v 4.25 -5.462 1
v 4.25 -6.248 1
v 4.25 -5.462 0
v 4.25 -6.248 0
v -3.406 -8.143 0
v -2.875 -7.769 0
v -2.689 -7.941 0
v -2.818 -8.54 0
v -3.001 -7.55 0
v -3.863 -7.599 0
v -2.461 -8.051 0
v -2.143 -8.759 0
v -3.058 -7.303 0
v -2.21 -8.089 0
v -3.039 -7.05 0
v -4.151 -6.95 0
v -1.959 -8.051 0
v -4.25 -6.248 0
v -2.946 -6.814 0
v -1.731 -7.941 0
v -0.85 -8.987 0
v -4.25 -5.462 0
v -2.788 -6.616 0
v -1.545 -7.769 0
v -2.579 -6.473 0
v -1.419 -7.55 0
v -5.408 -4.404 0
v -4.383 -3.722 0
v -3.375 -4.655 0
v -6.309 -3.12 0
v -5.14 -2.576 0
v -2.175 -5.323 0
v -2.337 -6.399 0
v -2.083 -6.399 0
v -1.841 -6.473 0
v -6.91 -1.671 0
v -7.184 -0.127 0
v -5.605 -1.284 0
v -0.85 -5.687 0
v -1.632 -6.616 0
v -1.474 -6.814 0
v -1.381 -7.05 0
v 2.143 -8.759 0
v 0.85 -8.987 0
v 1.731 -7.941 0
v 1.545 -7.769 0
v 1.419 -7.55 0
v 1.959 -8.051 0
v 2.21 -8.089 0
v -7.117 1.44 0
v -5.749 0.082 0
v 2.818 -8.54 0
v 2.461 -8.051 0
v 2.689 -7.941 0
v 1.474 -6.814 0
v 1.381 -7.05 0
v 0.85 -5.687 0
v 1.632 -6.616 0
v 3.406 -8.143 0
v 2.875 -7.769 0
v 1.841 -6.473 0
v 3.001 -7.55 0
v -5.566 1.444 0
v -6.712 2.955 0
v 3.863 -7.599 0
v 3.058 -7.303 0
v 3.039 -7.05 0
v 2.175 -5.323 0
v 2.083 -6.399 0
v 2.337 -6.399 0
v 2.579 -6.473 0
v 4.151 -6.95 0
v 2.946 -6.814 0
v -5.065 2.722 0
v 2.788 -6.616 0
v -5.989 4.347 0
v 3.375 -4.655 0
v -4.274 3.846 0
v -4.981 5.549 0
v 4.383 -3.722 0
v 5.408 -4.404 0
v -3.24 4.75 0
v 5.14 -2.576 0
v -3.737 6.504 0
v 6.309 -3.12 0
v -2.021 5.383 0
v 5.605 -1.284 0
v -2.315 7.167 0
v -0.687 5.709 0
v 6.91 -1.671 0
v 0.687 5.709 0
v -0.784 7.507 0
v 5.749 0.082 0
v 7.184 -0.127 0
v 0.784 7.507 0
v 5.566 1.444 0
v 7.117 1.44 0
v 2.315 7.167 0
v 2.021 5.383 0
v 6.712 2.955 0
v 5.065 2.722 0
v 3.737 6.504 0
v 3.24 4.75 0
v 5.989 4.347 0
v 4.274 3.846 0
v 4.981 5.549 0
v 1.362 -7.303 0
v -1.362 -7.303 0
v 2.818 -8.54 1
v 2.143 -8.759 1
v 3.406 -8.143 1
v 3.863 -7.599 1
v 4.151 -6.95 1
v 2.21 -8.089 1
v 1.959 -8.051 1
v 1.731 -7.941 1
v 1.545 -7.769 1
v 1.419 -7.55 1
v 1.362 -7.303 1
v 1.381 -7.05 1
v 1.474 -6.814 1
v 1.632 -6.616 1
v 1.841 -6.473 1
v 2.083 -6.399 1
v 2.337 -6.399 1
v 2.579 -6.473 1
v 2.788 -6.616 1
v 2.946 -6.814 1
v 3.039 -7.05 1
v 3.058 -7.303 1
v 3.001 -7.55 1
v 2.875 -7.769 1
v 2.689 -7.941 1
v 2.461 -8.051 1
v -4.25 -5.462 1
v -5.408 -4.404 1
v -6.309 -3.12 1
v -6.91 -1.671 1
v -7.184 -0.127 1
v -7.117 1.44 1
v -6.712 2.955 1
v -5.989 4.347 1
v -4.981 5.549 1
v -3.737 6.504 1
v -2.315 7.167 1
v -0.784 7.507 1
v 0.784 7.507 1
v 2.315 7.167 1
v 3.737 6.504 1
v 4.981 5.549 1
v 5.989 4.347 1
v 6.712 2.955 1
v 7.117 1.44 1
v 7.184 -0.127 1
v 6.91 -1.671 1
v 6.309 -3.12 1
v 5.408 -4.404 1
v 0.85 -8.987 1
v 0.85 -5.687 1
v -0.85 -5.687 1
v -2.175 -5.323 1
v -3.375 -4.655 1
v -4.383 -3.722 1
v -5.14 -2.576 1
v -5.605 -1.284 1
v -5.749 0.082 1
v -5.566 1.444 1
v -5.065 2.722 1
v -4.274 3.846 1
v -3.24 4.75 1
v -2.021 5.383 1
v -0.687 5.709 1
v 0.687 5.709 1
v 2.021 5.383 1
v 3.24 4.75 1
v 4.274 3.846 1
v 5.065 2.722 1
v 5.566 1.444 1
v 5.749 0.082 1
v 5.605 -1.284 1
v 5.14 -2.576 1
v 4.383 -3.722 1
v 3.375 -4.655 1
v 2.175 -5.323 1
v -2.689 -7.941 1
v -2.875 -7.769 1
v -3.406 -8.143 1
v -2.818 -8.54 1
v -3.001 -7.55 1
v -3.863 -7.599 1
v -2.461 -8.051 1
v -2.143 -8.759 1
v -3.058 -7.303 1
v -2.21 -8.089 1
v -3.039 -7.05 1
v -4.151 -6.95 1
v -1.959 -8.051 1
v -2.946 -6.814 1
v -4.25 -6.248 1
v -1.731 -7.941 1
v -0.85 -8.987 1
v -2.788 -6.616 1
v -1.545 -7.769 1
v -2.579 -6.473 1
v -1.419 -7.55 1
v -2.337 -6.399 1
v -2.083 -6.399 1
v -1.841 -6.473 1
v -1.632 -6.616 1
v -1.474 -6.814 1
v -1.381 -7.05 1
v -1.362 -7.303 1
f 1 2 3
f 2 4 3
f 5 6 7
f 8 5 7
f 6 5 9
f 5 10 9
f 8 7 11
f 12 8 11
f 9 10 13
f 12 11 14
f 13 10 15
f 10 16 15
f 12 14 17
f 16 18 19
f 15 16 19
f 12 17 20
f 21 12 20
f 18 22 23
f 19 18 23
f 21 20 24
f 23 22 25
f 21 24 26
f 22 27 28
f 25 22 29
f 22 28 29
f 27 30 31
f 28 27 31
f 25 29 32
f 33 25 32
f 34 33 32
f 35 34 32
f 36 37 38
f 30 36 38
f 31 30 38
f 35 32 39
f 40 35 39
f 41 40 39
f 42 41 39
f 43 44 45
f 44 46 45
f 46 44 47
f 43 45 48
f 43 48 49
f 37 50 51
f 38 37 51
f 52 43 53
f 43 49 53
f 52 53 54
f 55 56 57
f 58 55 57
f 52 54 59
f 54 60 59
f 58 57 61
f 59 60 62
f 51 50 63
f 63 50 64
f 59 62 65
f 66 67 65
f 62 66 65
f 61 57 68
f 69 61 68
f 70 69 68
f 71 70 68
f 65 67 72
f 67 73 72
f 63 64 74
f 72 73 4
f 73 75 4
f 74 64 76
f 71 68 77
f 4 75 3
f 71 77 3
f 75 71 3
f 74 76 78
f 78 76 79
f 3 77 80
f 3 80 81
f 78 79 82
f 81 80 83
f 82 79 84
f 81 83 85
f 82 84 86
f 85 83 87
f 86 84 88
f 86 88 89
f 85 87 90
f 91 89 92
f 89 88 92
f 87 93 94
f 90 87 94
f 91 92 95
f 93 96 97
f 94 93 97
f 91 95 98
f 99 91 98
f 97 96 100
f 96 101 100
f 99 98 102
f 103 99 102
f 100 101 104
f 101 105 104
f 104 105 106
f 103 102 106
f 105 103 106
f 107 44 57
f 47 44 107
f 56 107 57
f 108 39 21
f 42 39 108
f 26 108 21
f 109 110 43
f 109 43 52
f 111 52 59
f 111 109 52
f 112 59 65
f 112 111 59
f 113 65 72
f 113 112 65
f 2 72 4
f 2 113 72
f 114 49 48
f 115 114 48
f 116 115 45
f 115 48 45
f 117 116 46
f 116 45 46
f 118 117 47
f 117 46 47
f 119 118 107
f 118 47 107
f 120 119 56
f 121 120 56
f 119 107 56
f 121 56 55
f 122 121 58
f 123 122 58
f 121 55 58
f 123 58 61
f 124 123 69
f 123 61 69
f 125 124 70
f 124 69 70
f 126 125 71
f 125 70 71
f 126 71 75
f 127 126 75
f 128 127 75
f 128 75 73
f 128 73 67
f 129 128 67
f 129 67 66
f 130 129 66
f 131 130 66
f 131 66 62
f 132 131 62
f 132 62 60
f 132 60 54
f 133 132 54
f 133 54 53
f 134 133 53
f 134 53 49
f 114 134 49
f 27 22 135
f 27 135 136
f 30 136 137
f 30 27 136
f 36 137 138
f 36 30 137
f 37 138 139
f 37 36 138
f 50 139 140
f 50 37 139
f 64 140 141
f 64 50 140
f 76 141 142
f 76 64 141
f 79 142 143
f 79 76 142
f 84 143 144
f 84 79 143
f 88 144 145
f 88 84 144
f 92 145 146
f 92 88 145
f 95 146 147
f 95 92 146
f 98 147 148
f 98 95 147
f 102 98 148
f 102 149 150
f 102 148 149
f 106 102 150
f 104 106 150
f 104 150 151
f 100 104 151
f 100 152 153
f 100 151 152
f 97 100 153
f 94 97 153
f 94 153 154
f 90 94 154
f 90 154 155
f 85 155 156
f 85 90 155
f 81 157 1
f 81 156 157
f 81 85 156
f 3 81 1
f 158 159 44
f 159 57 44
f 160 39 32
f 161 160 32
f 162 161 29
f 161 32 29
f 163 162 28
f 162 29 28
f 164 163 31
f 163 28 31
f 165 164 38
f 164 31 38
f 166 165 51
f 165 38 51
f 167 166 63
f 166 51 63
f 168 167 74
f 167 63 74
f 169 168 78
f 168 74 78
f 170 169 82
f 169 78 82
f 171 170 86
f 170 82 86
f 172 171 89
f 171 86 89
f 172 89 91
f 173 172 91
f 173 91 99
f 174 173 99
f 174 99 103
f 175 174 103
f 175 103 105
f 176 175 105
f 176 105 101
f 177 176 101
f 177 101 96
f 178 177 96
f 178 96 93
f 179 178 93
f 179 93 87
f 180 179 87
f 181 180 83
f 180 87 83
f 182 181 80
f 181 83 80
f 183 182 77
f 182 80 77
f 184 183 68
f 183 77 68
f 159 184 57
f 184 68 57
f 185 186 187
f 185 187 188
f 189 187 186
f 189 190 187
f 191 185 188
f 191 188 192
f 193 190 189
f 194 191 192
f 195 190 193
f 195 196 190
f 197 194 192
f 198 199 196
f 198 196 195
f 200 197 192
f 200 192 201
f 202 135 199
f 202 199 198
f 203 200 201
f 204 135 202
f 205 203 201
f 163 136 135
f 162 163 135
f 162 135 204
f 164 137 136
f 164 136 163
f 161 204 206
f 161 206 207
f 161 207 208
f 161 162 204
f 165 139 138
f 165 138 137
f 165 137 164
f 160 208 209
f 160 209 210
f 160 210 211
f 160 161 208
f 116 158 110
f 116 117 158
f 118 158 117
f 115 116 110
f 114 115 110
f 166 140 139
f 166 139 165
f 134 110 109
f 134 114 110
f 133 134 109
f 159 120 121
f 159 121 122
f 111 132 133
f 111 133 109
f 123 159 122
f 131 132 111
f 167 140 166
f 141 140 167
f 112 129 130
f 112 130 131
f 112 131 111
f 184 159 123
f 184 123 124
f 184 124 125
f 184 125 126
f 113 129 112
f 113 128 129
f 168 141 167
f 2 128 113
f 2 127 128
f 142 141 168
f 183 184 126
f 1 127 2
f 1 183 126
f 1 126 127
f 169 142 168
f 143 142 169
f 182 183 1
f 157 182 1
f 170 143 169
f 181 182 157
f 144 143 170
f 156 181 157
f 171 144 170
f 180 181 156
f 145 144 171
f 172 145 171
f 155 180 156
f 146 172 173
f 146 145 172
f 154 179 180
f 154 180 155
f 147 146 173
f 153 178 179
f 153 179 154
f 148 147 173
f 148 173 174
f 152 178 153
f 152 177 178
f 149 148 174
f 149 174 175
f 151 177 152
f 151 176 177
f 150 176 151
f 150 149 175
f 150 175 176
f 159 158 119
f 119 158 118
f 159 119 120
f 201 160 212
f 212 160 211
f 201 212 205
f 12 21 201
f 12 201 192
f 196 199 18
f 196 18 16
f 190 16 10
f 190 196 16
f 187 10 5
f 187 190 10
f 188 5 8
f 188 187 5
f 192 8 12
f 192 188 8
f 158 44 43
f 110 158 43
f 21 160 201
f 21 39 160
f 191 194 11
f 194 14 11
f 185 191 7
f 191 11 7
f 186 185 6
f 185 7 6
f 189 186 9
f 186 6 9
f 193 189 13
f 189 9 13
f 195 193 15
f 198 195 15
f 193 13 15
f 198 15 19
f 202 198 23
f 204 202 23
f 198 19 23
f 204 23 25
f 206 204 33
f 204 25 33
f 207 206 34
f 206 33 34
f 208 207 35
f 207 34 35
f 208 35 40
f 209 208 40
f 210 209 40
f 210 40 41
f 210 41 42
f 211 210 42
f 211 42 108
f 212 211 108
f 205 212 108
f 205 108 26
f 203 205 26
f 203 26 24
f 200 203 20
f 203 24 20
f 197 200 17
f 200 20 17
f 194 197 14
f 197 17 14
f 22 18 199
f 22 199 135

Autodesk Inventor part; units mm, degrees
ref_plane "WorkPlane1" through (0, 0, 0) normal (0, 0, 1) x (1, 0, 0)
ref_plane "Work Plane2" through (0, 0, -1) normal (0, 0, 1) x (1, 0, 0)
ref_plane "WorkPlane2" through (0, 0, 1.5) normal (0, 0, 1) x (1, 0, 0)
sketch "Sketch1" plane through (0, 0, 0) normal (0, 0, 1) x (1, 0, 0)
  point P0 (0, 0)
sketch "Sketch2" plane through (0, 0, 0) normal (0, 0, 1) x (1, 0, 0)
  line L0 (4.25, -8.3873) -> (4.25, -5.4618)
  line L1 (0.85, -8.9868) -> (4.25, -8.3873)
  line L2 (0.85, -5.6868) -> (0.85, -8.9868)
  arc A0 (0.85, -5.6868) -> (-0.85, -5.6868) centre (0, 0) ccw
  line L3 (-0.85, -5.6868) -> (-0.85, -8.9868)
  line L4 (-0.85, -8.9868) -> (-4.25, -8.3873)
  line L5 (-4.25, -8.3873) -> (-4.25, -5.4618)
  arc A1 (4.25, -5.4618) -> (-4.25, -5.4618) centre (0, 0.35) ccw
  dimension "d2" = 5.75
  dimension "d4" = 7.2
  dimension "d6" = 0
  dimension "d8" = 0.85
  dimension "d10" = 0.85
  dimension "d12" = 3.3
  dimension "d14" = 3.3
  dimension "d16" = 80
  dimension "d18" = 80
  dimension "d20" = 3.4
  dimension "d22" = 3.4
  dimension "d24" = 0.35
  dimension "d52" = 0
  dimension "d53" = 0
extrude "Extrusion1" add sketch "Sketch2" along normal blind 1
sketch "Sketch3" plane through (0, 0, 1) normal (0, 0, 1) x (1, 0, 0)
  line L0 (-0.85, -5.6868) -> (-0.85, -8.9868) projected
  line L1 (-0.85, -8.9868) -> (-4.25, -8.3873) projected
  point P0 (-2.21, -7.2391)
  dimension "d30" = 1.36
  dimension "d32" = 1.485
hole "Hole1" at (-2.21, -7.2391, 1) direction (0, 0, -1) diameter 1.7 end through all
sketch "Sketch4" plane through (0, 0, 1) normal (0, 0, 1) x (1, 0, 0)
  line L0 (0.85, -8.9868) -> (0.85, -5.6868) projected
  line L1 (4.25, -8.3873) -> (0.85, -8.9868) projected
  point P0 (2.21, -7.2391)
  dimension "d41" = 1.36
  dimension "d43" = 1.485
hole "Hole2" at (2.21, -7.2391, 1) direction (0, 0, -1) diameter 1.7 end through all
fillet "Fillet1" radius 2.55 2 edges at (-4.25, -8.3873, 0.5) (4.25, -8.3873, 0.5)
equation "\"d30\" = 0.8 * Diam5"
equation "\"d32\" = 0.45 * ParA"
equation "\"d33\" = Diam5"
equation "\"d41\" = 0.8 * Diam5"
equation "\"d43\" = 0.45 * ParA"
equation "\"d44\" = Diam5"
equation "\"d51\" = 1.5 * Diam5"
equation "\"d2\" = 0.5 * Diam2"
equation "\"d4\" = 0.166667 * ParA + 0.5 * Diam2 + 0.5 * b"
equation "\"d8\" = 0.5 * Diam5"
equation "\"d10\" = 0.5 * Diam5"
equation "\"d12\" = ParA"
equation "\"d14\" = ParA"
equation "\"d20\" = 2 * Diam5"
equation "\"d22\" = 2 * Diam5"
equation "\"d24\" = -msp_r2 + 0.5 * Diam2 + b"
equation "\"d25\" = ParS"
equation "\"Diam5\" = 1.7"
equation "\"ParA\" = 3.3"
equation "\"ParS\" = 1"
equation "\"Diam2\" = 11.5"
equation "\"msp_r2\" = 0.166667 * ParA + 0.5 * Diam2 + 0.5 * b"
equation "\"TEMPLATE\" = 1.2345"
properties part number "DIN 471 - 12x1" material "Steel, Mild"
